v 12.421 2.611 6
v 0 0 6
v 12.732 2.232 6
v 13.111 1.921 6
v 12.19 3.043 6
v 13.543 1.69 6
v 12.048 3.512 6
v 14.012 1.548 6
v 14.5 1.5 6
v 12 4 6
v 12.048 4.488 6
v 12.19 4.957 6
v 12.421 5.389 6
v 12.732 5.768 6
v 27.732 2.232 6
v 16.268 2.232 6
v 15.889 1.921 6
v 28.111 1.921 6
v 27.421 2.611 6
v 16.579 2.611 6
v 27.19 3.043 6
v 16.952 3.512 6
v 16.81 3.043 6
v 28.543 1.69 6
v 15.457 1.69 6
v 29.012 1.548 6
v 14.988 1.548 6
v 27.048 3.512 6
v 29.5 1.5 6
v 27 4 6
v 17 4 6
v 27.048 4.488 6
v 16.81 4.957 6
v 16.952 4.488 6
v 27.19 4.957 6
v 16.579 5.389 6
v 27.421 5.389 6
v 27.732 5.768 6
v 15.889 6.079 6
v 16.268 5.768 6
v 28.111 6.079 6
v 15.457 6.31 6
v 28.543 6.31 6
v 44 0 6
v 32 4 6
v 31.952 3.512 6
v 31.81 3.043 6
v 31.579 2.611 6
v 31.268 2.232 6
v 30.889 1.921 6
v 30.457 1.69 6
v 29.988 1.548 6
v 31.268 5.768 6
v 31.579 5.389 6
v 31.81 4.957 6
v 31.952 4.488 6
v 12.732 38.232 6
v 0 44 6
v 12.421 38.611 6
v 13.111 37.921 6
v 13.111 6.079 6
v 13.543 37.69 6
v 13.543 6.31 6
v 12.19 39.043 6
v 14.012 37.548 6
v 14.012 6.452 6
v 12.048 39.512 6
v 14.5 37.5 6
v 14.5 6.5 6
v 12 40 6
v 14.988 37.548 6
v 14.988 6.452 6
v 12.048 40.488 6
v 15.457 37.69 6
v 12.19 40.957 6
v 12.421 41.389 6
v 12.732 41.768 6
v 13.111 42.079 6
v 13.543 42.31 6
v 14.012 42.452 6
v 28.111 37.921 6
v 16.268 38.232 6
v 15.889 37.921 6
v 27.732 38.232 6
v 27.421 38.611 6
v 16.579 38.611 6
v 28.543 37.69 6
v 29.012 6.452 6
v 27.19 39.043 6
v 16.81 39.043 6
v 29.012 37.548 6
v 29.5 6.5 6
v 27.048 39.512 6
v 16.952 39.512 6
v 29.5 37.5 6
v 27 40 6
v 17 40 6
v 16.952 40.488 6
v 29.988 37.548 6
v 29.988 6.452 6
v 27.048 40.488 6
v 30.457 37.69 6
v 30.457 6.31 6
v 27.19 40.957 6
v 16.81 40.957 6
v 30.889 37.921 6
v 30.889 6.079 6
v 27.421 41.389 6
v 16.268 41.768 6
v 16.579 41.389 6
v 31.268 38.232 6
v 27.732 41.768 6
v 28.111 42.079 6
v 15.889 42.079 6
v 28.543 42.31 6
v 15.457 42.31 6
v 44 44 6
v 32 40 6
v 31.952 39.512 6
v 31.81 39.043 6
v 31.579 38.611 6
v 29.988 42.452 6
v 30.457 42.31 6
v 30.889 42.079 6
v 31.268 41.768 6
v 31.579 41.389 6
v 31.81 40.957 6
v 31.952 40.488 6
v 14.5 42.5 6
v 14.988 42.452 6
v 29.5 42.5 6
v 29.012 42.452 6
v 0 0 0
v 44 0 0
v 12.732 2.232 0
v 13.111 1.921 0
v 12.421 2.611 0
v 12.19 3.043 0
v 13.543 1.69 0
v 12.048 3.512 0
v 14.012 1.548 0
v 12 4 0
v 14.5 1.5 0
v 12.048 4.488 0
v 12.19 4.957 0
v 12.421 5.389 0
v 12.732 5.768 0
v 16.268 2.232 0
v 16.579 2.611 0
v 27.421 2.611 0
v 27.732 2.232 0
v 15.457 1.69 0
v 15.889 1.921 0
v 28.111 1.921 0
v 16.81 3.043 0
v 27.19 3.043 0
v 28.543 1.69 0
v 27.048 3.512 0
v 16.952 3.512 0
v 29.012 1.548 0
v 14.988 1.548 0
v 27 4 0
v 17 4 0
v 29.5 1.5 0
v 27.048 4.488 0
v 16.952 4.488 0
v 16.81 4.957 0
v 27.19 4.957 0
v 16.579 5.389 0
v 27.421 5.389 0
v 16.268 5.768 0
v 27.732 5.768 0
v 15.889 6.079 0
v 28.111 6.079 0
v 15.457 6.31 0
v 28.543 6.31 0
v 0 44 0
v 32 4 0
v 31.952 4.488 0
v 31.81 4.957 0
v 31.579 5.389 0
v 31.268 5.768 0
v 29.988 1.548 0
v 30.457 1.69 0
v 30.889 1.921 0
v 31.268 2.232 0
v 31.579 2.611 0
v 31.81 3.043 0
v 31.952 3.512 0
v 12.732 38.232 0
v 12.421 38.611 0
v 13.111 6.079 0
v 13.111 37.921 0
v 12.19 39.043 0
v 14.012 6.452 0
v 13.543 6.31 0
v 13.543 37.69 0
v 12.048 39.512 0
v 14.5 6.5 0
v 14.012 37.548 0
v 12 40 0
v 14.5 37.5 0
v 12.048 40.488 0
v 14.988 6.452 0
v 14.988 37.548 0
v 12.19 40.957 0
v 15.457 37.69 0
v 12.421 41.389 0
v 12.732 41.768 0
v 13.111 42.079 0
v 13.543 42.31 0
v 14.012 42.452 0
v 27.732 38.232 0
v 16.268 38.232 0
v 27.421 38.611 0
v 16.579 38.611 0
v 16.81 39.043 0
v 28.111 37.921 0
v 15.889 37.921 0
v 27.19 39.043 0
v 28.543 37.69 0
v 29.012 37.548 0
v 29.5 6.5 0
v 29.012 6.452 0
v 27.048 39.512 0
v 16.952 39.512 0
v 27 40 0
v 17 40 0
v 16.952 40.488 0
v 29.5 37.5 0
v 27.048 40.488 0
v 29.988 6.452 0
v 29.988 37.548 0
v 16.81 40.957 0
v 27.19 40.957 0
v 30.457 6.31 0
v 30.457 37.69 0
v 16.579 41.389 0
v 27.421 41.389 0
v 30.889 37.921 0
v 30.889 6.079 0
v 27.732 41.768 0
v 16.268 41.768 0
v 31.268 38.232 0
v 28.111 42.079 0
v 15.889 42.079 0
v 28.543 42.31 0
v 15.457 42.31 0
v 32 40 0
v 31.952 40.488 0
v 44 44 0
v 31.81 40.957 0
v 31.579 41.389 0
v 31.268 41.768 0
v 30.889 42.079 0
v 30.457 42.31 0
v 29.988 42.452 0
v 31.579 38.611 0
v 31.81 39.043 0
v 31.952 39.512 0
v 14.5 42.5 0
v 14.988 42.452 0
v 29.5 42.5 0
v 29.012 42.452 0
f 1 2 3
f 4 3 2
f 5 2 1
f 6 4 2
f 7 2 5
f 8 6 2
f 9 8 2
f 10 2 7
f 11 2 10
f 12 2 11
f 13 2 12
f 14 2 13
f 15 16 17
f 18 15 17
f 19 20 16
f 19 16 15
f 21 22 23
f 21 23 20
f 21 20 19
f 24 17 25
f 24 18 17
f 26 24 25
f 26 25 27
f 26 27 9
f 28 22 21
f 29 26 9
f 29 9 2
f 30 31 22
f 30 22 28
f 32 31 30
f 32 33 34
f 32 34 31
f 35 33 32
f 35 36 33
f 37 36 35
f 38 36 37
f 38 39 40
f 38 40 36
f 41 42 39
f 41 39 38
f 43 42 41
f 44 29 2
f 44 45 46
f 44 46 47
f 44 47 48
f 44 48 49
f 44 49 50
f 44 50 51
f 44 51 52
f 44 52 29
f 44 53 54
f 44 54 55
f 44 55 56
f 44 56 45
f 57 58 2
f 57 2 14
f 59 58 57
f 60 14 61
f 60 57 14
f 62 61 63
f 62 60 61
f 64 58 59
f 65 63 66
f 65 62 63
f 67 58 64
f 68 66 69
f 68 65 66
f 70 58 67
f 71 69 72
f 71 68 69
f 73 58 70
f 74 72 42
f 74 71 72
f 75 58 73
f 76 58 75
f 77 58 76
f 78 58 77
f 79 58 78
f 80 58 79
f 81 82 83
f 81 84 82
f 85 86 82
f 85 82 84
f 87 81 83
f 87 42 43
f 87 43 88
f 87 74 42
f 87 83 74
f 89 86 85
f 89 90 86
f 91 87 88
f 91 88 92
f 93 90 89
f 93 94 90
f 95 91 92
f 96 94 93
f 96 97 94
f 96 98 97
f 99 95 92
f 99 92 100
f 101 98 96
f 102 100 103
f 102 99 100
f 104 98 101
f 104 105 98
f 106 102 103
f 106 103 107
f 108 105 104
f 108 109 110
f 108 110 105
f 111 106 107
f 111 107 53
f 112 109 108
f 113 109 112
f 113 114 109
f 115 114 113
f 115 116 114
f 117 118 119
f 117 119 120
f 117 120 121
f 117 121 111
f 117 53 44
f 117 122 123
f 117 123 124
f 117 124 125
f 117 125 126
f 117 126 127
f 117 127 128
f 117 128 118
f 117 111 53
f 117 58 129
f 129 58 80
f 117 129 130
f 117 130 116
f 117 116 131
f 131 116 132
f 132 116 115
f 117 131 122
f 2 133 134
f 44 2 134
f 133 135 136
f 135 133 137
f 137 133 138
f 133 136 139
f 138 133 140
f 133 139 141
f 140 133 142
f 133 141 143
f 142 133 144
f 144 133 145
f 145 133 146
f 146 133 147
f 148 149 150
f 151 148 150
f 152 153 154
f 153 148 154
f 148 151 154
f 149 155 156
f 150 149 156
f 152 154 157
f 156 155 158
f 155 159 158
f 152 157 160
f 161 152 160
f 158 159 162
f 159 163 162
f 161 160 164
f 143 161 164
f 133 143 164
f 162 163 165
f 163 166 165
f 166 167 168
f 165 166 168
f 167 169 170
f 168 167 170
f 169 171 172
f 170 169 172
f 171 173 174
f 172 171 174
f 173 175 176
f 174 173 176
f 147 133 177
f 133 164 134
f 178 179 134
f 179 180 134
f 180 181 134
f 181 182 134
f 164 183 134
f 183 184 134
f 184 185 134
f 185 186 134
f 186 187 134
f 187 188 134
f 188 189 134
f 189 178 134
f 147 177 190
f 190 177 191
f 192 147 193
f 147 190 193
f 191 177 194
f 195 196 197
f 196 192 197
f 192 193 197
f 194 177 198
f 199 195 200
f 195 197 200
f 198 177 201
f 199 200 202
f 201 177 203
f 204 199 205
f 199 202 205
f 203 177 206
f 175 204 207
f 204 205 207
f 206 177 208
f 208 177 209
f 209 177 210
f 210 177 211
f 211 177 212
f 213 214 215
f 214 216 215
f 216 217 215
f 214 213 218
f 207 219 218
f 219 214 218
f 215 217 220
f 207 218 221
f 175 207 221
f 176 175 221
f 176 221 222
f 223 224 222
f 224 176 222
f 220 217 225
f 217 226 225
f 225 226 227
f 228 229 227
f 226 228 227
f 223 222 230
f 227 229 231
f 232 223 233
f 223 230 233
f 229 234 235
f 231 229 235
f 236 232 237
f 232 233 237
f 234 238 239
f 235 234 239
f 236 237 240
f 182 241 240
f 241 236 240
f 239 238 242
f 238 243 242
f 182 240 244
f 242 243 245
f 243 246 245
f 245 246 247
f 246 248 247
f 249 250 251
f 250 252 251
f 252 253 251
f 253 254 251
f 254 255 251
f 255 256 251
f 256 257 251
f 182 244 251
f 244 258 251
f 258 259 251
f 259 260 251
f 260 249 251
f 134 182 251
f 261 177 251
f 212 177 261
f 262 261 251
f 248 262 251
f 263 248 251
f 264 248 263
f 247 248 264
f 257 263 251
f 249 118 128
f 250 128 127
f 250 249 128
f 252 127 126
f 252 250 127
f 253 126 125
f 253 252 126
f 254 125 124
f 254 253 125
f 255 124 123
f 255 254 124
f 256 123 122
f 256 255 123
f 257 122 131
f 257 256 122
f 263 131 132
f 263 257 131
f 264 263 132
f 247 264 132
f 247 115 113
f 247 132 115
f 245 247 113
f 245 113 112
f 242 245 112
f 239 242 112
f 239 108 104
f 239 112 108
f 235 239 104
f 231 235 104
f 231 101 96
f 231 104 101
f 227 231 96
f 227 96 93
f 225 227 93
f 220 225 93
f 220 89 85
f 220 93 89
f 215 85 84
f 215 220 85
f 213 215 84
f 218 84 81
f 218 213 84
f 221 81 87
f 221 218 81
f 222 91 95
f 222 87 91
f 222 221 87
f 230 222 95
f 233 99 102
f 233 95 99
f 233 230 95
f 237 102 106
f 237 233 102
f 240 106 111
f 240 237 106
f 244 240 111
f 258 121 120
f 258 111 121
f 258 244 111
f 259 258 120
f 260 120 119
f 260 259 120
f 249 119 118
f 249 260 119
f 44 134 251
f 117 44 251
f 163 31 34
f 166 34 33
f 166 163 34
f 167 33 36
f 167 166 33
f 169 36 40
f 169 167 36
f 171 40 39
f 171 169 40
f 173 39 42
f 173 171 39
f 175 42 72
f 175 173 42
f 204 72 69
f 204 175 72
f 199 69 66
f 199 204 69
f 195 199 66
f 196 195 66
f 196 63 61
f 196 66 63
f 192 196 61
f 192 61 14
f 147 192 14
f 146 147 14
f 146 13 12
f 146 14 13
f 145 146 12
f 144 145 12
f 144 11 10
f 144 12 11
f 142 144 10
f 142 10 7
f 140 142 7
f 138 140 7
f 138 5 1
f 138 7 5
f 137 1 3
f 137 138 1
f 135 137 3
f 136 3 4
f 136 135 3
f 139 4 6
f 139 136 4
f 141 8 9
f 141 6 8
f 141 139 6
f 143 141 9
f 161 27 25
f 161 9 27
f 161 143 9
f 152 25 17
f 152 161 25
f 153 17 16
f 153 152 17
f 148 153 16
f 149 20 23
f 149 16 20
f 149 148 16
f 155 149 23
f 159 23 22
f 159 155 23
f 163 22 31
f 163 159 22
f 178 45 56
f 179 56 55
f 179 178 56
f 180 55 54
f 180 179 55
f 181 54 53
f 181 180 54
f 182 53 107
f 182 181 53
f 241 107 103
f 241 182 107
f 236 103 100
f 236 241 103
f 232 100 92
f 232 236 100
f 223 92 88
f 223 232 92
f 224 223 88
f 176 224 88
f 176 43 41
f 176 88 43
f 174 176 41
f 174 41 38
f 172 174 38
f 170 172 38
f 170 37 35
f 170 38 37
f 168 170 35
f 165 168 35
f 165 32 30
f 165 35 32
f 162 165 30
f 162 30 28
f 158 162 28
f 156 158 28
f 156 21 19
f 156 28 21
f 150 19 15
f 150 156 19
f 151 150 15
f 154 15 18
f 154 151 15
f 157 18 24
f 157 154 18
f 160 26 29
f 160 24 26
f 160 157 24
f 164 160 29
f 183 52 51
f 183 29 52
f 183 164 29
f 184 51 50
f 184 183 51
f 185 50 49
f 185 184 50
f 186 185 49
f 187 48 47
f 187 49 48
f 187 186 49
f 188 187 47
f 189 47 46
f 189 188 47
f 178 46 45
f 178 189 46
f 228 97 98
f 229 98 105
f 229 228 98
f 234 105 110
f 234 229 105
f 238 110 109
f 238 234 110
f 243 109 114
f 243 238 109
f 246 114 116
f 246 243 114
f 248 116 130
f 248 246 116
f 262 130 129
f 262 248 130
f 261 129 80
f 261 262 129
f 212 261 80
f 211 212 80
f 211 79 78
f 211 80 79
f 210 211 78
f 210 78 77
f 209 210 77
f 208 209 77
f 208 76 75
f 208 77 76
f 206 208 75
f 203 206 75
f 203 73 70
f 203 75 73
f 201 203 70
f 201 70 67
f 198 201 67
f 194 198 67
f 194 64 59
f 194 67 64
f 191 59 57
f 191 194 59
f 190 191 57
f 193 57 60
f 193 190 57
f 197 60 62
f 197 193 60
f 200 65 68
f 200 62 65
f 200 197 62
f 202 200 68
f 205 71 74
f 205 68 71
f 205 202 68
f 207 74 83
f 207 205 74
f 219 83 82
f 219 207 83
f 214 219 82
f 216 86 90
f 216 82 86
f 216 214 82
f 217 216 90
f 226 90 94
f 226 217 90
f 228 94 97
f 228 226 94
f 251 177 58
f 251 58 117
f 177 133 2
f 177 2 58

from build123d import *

# Parameters (mm, degrees)
CYLINDER003_R     = 2.5
CYLINDER003_DEPTH = 10
CYLINDER002_R     = 2.5
CYLINDER002_DEPTH = 10
CYLINDER001_R     = 2.5
CYLINDER001_DEPTH = 10
CYLINDER_R        = 2.5
CYLINDER_DEPTH    = 10
BOX_W             = 44
BOX_H             = 44
BOX_DEPTH         = 6


with BuildPart() as cylinder003:
    # Cylinder003 → Cylinder003 (new body)
    with BuildSketch(Plane(origin=(29.5, 40, 0), x_dir=(1, 0, 0), z_dir=(0, 0, 1))):
        Circle(CYLINDER003_R)
    extrude(amount=CYLINDER003_DEPTH)


with BuildPart() as cylinder002:
    # Cylinder002 → Cylinder002 (new body)
    with BuildSketch(Plane(origin=(14.5, 40, 0), x_dir=(1, 0, 0), z_dir=(0, 0, 1))):
        Circle(CYLINDER002_R)
    extrude(amount=CYLINDER002_DEPTH)


with BuildPart() as cylinder001:
    # Cylinder001 → Cylinder001 (new body)
    with BuildSketch(Plane(origin=(29.5, 4, 0), x_dir=(1, 0, 0), z_dir=(0, 0, 1))):
        Circle(CYLINDER001_R)
    extrude(amount=CYLINDER001_DEPTH)


with BuildPart() as cylinder:
    # Cylinder → Cylinder (new body)
    with BuildSketch(Plane(origin=(14.5, 4, 0), x_dir=(1, 0, 0), z_dir=(0, 0, 1))):
        Circle(CYLINDER_R)
    extrude(amount=CYLINDER_DEPTH)


with BuildPart() as cut003:
    # Box → Box (new body)
    with BuildSketch(Plane.XY):
        with Locations((22, 22)):
            Rectangle(BOX_W, BOX_H)
    extrude(amount=BOX_DEPTH)

    # Cut: cut Cylinder
    add(cylinder.part, mode=Mode.SUBTRACT)

    # Cut001: cut Cylinder001
    add(cylinder001.part, mode=Mode.SUBTRACT)

    # Cut002: cut Cylinder002
    add(cylinder002.part, mode=Mode.SUBTRACT)

    # Cut003: cut Cylinder003
    add(cylinder003.part, mode=Mode.SUBTRACT)


solid = cut003.part
